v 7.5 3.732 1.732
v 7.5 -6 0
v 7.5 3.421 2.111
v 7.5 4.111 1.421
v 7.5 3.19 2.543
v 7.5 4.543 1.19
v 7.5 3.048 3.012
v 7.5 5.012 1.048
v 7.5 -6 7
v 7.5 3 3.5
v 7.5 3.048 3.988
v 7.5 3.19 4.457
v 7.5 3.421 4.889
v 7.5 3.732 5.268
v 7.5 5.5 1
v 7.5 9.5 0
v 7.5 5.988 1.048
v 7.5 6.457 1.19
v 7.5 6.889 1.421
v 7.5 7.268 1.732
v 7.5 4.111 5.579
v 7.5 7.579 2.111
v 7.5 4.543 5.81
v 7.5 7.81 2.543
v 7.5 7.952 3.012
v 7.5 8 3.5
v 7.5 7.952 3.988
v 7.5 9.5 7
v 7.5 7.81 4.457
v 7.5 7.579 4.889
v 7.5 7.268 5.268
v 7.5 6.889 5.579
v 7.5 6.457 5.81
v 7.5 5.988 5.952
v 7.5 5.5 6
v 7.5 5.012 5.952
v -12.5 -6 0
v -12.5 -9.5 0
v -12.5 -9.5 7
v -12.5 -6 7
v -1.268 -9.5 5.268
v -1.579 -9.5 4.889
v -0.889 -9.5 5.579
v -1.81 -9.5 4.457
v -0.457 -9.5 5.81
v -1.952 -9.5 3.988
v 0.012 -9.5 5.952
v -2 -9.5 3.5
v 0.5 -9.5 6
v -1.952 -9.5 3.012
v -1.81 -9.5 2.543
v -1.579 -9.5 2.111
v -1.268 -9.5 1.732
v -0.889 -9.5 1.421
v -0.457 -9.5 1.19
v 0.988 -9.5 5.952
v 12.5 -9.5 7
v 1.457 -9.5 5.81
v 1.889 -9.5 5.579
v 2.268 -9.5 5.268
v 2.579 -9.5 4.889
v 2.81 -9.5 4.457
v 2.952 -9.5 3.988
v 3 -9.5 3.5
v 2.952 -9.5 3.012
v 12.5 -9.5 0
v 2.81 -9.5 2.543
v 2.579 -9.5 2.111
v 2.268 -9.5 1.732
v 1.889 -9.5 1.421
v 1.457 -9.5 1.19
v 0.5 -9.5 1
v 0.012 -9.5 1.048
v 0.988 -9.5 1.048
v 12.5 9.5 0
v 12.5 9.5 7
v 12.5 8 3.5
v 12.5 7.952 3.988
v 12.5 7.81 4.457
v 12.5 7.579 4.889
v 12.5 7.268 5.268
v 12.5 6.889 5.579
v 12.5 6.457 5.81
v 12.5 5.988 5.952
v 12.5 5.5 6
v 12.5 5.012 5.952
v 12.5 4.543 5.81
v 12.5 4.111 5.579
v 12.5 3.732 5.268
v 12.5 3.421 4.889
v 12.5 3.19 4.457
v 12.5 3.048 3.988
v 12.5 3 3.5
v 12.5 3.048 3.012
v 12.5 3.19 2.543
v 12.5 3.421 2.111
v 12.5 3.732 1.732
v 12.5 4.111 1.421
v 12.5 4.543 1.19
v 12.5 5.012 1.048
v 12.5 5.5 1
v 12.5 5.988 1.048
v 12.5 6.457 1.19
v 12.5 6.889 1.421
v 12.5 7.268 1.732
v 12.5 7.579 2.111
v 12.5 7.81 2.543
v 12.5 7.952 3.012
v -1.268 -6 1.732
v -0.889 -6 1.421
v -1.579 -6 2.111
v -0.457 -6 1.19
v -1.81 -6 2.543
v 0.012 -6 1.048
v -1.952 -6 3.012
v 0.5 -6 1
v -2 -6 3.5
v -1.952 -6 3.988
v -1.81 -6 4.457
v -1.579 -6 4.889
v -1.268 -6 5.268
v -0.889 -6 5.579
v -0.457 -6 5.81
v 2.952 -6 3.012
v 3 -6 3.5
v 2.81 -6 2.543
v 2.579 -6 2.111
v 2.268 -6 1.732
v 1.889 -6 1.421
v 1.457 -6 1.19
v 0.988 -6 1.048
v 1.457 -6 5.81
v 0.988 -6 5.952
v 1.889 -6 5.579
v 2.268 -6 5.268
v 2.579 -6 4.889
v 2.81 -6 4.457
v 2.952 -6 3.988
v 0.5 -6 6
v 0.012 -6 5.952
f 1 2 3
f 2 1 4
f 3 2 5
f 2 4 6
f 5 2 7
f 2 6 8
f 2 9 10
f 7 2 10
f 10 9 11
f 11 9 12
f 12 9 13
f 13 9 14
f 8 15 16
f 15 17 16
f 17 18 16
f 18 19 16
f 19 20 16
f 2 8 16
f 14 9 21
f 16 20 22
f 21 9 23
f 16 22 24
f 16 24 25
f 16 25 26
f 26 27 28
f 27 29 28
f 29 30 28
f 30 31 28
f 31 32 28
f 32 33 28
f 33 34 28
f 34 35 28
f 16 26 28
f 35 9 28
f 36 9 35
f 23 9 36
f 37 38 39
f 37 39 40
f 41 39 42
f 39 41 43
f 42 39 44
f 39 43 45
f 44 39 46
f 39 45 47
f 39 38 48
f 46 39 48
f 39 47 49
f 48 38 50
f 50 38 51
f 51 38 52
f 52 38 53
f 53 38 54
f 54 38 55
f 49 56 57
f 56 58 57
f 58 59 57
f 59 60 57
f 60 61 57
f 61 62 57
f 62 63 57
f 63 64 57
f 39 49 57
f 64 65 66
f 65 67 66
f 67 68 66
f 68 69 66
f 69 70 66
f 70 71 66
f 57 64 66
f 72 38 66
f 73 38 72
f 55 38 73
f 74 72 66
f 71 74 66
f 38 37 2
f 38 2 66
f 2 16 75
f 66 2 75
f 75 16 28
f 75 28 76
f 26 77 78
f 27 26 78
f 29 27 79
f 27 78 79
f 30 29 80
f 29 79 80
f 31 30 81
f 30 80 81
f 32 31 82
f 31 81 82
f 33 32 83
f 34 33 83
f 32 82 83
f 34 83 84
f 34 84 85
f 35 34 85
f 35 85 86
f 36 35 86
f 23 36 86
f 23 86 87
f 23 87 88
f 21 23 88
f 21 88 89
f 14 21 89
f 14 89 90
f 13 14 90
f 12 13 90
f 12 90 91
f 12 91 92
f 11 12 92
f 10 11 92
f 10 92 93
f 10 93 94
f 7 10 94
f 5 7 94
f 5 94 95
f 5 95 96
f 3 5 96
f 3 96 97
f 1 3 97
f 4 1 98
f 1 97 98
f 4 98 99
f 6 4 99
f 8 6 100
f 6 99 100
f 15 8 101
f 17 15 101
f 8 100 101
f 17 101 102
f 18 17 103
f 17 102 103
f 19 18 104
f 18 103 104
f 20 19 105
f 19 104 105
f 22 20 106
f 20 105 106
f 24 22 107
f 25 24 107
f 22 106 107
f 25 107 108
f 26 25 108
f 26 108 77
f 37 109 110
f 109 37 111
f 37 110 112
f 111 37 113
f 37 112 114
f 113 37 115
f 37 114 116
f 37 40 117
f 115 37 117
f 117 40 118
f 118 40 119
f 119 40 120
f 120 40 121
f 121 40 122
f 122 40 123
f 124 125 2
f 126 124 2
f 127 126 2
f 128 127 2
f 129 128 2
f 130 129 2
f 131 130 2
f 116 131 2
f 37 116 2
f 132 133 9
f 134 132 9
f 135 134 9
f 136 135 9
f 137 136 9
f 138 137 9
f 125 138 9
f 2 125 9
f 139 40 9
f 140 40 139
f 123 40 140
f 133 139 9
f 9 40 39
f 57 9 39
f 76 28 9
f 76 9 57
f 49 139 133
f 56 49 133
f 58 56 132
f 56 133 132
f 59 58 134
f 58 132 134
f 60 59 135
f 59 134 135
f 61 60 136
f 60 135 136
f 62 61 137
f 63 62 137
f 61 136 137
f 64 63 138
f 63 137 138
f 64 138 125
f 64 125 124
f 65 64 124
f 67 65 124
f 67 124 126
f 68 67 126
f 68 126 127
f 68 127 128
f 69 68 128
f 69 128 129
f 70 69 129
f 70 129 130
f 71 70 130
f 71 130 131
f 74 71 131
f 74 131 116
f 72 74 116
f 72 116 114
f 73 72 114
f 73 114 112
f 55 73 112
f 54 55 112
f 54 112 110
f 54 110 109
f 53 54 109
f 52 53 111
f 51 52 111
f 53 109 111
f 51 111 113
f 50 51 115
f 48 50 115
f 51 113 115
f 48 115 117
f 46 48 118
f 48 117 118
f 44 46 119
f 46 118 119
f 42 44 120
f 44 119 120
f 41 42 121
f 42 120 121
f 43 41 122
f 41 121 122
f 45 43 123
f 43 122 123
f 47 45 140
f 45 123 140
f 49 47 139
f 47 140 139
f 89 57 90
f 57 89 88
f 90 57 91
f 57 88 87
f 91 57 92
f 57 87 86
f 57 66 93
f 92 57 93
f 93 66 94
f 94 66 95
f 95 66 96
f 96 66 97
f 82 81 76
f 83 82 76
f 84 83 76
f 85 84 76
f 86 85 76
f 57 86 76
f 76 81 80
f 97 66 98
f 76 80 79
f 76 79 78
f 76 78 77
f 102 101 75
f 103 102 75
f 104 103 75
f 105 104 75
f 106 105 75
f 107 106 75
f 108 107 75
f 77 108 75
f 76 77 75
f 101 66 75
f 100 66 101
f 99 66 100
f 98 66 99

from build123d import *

# Parameters (mm, degrees)
SKETCH1_W           = 25
SKETCH1_H           = 19
BOSS_EXTRUDE1_DEPTH = 7
SKETCH2_W           = 20
SKETCH2_H           = 15.5
CUT_EXTRUDE1_DEPTH  = 7
SKETCH4_R           = 2.5
CUT_EXTRUDE3_DEPTH  = 22.106870919
SKETCH5_R           = 2.5
CUT_EXTRUDE4_DEPTH  = 10


with BuildPart() as part:
    # Sketch1 → Boss-Extrude1 (new body)
    with BuildSketch(Plane.XY):
        Rectangle(SKETCH1_W, SKETCH1_H)
    extrude(amount=BOSS_EXTRUDE1_DEPTH)

    # Sketch2 → Cut-Extrude1 (cut)
    with BuildSketch(Plane.XY.offset(7)):
        with Locations((-2.5, 1.75)):
            Rectangle(SKETCH2_W, SKETCH2_H)
    extrude(amount=-CUT_EXTRUDE1_DEPTH, mode=Mode.SUBTRACT)

    # Sketch4 → Cut-Extrude3 (cut, through all)
    with BuildSketch(Plane(origin=(0, -6, 0), x_dir=(1, 0, 0), z_dir=(0, 1, 0))):
        with Locations(Location((0.5, -3.5, 0), (0, 0, 270))):
            Circle(SKETCH4_R)
    extrude(amount=-CUT_EXTRUDE3_DEPTH, mode=Mode.SUBTRACT)

    # Sketch5 → Cut-Extrude4 (cut)
    with BuildSketch(Plane(origin=(12.5, 0, 0), x_dir=(0, 0, -1), z_dir=(1, 0, 0))):
        with Locations(Location((-3.5, 5.5, 0), (0, 0, 90))):
            Circle(SKETCH5_R)
    extrude(amount=-CUT_EXTRUDE4_DEPTH, mode=Mode.SUBTRACT)


solid = part.part
